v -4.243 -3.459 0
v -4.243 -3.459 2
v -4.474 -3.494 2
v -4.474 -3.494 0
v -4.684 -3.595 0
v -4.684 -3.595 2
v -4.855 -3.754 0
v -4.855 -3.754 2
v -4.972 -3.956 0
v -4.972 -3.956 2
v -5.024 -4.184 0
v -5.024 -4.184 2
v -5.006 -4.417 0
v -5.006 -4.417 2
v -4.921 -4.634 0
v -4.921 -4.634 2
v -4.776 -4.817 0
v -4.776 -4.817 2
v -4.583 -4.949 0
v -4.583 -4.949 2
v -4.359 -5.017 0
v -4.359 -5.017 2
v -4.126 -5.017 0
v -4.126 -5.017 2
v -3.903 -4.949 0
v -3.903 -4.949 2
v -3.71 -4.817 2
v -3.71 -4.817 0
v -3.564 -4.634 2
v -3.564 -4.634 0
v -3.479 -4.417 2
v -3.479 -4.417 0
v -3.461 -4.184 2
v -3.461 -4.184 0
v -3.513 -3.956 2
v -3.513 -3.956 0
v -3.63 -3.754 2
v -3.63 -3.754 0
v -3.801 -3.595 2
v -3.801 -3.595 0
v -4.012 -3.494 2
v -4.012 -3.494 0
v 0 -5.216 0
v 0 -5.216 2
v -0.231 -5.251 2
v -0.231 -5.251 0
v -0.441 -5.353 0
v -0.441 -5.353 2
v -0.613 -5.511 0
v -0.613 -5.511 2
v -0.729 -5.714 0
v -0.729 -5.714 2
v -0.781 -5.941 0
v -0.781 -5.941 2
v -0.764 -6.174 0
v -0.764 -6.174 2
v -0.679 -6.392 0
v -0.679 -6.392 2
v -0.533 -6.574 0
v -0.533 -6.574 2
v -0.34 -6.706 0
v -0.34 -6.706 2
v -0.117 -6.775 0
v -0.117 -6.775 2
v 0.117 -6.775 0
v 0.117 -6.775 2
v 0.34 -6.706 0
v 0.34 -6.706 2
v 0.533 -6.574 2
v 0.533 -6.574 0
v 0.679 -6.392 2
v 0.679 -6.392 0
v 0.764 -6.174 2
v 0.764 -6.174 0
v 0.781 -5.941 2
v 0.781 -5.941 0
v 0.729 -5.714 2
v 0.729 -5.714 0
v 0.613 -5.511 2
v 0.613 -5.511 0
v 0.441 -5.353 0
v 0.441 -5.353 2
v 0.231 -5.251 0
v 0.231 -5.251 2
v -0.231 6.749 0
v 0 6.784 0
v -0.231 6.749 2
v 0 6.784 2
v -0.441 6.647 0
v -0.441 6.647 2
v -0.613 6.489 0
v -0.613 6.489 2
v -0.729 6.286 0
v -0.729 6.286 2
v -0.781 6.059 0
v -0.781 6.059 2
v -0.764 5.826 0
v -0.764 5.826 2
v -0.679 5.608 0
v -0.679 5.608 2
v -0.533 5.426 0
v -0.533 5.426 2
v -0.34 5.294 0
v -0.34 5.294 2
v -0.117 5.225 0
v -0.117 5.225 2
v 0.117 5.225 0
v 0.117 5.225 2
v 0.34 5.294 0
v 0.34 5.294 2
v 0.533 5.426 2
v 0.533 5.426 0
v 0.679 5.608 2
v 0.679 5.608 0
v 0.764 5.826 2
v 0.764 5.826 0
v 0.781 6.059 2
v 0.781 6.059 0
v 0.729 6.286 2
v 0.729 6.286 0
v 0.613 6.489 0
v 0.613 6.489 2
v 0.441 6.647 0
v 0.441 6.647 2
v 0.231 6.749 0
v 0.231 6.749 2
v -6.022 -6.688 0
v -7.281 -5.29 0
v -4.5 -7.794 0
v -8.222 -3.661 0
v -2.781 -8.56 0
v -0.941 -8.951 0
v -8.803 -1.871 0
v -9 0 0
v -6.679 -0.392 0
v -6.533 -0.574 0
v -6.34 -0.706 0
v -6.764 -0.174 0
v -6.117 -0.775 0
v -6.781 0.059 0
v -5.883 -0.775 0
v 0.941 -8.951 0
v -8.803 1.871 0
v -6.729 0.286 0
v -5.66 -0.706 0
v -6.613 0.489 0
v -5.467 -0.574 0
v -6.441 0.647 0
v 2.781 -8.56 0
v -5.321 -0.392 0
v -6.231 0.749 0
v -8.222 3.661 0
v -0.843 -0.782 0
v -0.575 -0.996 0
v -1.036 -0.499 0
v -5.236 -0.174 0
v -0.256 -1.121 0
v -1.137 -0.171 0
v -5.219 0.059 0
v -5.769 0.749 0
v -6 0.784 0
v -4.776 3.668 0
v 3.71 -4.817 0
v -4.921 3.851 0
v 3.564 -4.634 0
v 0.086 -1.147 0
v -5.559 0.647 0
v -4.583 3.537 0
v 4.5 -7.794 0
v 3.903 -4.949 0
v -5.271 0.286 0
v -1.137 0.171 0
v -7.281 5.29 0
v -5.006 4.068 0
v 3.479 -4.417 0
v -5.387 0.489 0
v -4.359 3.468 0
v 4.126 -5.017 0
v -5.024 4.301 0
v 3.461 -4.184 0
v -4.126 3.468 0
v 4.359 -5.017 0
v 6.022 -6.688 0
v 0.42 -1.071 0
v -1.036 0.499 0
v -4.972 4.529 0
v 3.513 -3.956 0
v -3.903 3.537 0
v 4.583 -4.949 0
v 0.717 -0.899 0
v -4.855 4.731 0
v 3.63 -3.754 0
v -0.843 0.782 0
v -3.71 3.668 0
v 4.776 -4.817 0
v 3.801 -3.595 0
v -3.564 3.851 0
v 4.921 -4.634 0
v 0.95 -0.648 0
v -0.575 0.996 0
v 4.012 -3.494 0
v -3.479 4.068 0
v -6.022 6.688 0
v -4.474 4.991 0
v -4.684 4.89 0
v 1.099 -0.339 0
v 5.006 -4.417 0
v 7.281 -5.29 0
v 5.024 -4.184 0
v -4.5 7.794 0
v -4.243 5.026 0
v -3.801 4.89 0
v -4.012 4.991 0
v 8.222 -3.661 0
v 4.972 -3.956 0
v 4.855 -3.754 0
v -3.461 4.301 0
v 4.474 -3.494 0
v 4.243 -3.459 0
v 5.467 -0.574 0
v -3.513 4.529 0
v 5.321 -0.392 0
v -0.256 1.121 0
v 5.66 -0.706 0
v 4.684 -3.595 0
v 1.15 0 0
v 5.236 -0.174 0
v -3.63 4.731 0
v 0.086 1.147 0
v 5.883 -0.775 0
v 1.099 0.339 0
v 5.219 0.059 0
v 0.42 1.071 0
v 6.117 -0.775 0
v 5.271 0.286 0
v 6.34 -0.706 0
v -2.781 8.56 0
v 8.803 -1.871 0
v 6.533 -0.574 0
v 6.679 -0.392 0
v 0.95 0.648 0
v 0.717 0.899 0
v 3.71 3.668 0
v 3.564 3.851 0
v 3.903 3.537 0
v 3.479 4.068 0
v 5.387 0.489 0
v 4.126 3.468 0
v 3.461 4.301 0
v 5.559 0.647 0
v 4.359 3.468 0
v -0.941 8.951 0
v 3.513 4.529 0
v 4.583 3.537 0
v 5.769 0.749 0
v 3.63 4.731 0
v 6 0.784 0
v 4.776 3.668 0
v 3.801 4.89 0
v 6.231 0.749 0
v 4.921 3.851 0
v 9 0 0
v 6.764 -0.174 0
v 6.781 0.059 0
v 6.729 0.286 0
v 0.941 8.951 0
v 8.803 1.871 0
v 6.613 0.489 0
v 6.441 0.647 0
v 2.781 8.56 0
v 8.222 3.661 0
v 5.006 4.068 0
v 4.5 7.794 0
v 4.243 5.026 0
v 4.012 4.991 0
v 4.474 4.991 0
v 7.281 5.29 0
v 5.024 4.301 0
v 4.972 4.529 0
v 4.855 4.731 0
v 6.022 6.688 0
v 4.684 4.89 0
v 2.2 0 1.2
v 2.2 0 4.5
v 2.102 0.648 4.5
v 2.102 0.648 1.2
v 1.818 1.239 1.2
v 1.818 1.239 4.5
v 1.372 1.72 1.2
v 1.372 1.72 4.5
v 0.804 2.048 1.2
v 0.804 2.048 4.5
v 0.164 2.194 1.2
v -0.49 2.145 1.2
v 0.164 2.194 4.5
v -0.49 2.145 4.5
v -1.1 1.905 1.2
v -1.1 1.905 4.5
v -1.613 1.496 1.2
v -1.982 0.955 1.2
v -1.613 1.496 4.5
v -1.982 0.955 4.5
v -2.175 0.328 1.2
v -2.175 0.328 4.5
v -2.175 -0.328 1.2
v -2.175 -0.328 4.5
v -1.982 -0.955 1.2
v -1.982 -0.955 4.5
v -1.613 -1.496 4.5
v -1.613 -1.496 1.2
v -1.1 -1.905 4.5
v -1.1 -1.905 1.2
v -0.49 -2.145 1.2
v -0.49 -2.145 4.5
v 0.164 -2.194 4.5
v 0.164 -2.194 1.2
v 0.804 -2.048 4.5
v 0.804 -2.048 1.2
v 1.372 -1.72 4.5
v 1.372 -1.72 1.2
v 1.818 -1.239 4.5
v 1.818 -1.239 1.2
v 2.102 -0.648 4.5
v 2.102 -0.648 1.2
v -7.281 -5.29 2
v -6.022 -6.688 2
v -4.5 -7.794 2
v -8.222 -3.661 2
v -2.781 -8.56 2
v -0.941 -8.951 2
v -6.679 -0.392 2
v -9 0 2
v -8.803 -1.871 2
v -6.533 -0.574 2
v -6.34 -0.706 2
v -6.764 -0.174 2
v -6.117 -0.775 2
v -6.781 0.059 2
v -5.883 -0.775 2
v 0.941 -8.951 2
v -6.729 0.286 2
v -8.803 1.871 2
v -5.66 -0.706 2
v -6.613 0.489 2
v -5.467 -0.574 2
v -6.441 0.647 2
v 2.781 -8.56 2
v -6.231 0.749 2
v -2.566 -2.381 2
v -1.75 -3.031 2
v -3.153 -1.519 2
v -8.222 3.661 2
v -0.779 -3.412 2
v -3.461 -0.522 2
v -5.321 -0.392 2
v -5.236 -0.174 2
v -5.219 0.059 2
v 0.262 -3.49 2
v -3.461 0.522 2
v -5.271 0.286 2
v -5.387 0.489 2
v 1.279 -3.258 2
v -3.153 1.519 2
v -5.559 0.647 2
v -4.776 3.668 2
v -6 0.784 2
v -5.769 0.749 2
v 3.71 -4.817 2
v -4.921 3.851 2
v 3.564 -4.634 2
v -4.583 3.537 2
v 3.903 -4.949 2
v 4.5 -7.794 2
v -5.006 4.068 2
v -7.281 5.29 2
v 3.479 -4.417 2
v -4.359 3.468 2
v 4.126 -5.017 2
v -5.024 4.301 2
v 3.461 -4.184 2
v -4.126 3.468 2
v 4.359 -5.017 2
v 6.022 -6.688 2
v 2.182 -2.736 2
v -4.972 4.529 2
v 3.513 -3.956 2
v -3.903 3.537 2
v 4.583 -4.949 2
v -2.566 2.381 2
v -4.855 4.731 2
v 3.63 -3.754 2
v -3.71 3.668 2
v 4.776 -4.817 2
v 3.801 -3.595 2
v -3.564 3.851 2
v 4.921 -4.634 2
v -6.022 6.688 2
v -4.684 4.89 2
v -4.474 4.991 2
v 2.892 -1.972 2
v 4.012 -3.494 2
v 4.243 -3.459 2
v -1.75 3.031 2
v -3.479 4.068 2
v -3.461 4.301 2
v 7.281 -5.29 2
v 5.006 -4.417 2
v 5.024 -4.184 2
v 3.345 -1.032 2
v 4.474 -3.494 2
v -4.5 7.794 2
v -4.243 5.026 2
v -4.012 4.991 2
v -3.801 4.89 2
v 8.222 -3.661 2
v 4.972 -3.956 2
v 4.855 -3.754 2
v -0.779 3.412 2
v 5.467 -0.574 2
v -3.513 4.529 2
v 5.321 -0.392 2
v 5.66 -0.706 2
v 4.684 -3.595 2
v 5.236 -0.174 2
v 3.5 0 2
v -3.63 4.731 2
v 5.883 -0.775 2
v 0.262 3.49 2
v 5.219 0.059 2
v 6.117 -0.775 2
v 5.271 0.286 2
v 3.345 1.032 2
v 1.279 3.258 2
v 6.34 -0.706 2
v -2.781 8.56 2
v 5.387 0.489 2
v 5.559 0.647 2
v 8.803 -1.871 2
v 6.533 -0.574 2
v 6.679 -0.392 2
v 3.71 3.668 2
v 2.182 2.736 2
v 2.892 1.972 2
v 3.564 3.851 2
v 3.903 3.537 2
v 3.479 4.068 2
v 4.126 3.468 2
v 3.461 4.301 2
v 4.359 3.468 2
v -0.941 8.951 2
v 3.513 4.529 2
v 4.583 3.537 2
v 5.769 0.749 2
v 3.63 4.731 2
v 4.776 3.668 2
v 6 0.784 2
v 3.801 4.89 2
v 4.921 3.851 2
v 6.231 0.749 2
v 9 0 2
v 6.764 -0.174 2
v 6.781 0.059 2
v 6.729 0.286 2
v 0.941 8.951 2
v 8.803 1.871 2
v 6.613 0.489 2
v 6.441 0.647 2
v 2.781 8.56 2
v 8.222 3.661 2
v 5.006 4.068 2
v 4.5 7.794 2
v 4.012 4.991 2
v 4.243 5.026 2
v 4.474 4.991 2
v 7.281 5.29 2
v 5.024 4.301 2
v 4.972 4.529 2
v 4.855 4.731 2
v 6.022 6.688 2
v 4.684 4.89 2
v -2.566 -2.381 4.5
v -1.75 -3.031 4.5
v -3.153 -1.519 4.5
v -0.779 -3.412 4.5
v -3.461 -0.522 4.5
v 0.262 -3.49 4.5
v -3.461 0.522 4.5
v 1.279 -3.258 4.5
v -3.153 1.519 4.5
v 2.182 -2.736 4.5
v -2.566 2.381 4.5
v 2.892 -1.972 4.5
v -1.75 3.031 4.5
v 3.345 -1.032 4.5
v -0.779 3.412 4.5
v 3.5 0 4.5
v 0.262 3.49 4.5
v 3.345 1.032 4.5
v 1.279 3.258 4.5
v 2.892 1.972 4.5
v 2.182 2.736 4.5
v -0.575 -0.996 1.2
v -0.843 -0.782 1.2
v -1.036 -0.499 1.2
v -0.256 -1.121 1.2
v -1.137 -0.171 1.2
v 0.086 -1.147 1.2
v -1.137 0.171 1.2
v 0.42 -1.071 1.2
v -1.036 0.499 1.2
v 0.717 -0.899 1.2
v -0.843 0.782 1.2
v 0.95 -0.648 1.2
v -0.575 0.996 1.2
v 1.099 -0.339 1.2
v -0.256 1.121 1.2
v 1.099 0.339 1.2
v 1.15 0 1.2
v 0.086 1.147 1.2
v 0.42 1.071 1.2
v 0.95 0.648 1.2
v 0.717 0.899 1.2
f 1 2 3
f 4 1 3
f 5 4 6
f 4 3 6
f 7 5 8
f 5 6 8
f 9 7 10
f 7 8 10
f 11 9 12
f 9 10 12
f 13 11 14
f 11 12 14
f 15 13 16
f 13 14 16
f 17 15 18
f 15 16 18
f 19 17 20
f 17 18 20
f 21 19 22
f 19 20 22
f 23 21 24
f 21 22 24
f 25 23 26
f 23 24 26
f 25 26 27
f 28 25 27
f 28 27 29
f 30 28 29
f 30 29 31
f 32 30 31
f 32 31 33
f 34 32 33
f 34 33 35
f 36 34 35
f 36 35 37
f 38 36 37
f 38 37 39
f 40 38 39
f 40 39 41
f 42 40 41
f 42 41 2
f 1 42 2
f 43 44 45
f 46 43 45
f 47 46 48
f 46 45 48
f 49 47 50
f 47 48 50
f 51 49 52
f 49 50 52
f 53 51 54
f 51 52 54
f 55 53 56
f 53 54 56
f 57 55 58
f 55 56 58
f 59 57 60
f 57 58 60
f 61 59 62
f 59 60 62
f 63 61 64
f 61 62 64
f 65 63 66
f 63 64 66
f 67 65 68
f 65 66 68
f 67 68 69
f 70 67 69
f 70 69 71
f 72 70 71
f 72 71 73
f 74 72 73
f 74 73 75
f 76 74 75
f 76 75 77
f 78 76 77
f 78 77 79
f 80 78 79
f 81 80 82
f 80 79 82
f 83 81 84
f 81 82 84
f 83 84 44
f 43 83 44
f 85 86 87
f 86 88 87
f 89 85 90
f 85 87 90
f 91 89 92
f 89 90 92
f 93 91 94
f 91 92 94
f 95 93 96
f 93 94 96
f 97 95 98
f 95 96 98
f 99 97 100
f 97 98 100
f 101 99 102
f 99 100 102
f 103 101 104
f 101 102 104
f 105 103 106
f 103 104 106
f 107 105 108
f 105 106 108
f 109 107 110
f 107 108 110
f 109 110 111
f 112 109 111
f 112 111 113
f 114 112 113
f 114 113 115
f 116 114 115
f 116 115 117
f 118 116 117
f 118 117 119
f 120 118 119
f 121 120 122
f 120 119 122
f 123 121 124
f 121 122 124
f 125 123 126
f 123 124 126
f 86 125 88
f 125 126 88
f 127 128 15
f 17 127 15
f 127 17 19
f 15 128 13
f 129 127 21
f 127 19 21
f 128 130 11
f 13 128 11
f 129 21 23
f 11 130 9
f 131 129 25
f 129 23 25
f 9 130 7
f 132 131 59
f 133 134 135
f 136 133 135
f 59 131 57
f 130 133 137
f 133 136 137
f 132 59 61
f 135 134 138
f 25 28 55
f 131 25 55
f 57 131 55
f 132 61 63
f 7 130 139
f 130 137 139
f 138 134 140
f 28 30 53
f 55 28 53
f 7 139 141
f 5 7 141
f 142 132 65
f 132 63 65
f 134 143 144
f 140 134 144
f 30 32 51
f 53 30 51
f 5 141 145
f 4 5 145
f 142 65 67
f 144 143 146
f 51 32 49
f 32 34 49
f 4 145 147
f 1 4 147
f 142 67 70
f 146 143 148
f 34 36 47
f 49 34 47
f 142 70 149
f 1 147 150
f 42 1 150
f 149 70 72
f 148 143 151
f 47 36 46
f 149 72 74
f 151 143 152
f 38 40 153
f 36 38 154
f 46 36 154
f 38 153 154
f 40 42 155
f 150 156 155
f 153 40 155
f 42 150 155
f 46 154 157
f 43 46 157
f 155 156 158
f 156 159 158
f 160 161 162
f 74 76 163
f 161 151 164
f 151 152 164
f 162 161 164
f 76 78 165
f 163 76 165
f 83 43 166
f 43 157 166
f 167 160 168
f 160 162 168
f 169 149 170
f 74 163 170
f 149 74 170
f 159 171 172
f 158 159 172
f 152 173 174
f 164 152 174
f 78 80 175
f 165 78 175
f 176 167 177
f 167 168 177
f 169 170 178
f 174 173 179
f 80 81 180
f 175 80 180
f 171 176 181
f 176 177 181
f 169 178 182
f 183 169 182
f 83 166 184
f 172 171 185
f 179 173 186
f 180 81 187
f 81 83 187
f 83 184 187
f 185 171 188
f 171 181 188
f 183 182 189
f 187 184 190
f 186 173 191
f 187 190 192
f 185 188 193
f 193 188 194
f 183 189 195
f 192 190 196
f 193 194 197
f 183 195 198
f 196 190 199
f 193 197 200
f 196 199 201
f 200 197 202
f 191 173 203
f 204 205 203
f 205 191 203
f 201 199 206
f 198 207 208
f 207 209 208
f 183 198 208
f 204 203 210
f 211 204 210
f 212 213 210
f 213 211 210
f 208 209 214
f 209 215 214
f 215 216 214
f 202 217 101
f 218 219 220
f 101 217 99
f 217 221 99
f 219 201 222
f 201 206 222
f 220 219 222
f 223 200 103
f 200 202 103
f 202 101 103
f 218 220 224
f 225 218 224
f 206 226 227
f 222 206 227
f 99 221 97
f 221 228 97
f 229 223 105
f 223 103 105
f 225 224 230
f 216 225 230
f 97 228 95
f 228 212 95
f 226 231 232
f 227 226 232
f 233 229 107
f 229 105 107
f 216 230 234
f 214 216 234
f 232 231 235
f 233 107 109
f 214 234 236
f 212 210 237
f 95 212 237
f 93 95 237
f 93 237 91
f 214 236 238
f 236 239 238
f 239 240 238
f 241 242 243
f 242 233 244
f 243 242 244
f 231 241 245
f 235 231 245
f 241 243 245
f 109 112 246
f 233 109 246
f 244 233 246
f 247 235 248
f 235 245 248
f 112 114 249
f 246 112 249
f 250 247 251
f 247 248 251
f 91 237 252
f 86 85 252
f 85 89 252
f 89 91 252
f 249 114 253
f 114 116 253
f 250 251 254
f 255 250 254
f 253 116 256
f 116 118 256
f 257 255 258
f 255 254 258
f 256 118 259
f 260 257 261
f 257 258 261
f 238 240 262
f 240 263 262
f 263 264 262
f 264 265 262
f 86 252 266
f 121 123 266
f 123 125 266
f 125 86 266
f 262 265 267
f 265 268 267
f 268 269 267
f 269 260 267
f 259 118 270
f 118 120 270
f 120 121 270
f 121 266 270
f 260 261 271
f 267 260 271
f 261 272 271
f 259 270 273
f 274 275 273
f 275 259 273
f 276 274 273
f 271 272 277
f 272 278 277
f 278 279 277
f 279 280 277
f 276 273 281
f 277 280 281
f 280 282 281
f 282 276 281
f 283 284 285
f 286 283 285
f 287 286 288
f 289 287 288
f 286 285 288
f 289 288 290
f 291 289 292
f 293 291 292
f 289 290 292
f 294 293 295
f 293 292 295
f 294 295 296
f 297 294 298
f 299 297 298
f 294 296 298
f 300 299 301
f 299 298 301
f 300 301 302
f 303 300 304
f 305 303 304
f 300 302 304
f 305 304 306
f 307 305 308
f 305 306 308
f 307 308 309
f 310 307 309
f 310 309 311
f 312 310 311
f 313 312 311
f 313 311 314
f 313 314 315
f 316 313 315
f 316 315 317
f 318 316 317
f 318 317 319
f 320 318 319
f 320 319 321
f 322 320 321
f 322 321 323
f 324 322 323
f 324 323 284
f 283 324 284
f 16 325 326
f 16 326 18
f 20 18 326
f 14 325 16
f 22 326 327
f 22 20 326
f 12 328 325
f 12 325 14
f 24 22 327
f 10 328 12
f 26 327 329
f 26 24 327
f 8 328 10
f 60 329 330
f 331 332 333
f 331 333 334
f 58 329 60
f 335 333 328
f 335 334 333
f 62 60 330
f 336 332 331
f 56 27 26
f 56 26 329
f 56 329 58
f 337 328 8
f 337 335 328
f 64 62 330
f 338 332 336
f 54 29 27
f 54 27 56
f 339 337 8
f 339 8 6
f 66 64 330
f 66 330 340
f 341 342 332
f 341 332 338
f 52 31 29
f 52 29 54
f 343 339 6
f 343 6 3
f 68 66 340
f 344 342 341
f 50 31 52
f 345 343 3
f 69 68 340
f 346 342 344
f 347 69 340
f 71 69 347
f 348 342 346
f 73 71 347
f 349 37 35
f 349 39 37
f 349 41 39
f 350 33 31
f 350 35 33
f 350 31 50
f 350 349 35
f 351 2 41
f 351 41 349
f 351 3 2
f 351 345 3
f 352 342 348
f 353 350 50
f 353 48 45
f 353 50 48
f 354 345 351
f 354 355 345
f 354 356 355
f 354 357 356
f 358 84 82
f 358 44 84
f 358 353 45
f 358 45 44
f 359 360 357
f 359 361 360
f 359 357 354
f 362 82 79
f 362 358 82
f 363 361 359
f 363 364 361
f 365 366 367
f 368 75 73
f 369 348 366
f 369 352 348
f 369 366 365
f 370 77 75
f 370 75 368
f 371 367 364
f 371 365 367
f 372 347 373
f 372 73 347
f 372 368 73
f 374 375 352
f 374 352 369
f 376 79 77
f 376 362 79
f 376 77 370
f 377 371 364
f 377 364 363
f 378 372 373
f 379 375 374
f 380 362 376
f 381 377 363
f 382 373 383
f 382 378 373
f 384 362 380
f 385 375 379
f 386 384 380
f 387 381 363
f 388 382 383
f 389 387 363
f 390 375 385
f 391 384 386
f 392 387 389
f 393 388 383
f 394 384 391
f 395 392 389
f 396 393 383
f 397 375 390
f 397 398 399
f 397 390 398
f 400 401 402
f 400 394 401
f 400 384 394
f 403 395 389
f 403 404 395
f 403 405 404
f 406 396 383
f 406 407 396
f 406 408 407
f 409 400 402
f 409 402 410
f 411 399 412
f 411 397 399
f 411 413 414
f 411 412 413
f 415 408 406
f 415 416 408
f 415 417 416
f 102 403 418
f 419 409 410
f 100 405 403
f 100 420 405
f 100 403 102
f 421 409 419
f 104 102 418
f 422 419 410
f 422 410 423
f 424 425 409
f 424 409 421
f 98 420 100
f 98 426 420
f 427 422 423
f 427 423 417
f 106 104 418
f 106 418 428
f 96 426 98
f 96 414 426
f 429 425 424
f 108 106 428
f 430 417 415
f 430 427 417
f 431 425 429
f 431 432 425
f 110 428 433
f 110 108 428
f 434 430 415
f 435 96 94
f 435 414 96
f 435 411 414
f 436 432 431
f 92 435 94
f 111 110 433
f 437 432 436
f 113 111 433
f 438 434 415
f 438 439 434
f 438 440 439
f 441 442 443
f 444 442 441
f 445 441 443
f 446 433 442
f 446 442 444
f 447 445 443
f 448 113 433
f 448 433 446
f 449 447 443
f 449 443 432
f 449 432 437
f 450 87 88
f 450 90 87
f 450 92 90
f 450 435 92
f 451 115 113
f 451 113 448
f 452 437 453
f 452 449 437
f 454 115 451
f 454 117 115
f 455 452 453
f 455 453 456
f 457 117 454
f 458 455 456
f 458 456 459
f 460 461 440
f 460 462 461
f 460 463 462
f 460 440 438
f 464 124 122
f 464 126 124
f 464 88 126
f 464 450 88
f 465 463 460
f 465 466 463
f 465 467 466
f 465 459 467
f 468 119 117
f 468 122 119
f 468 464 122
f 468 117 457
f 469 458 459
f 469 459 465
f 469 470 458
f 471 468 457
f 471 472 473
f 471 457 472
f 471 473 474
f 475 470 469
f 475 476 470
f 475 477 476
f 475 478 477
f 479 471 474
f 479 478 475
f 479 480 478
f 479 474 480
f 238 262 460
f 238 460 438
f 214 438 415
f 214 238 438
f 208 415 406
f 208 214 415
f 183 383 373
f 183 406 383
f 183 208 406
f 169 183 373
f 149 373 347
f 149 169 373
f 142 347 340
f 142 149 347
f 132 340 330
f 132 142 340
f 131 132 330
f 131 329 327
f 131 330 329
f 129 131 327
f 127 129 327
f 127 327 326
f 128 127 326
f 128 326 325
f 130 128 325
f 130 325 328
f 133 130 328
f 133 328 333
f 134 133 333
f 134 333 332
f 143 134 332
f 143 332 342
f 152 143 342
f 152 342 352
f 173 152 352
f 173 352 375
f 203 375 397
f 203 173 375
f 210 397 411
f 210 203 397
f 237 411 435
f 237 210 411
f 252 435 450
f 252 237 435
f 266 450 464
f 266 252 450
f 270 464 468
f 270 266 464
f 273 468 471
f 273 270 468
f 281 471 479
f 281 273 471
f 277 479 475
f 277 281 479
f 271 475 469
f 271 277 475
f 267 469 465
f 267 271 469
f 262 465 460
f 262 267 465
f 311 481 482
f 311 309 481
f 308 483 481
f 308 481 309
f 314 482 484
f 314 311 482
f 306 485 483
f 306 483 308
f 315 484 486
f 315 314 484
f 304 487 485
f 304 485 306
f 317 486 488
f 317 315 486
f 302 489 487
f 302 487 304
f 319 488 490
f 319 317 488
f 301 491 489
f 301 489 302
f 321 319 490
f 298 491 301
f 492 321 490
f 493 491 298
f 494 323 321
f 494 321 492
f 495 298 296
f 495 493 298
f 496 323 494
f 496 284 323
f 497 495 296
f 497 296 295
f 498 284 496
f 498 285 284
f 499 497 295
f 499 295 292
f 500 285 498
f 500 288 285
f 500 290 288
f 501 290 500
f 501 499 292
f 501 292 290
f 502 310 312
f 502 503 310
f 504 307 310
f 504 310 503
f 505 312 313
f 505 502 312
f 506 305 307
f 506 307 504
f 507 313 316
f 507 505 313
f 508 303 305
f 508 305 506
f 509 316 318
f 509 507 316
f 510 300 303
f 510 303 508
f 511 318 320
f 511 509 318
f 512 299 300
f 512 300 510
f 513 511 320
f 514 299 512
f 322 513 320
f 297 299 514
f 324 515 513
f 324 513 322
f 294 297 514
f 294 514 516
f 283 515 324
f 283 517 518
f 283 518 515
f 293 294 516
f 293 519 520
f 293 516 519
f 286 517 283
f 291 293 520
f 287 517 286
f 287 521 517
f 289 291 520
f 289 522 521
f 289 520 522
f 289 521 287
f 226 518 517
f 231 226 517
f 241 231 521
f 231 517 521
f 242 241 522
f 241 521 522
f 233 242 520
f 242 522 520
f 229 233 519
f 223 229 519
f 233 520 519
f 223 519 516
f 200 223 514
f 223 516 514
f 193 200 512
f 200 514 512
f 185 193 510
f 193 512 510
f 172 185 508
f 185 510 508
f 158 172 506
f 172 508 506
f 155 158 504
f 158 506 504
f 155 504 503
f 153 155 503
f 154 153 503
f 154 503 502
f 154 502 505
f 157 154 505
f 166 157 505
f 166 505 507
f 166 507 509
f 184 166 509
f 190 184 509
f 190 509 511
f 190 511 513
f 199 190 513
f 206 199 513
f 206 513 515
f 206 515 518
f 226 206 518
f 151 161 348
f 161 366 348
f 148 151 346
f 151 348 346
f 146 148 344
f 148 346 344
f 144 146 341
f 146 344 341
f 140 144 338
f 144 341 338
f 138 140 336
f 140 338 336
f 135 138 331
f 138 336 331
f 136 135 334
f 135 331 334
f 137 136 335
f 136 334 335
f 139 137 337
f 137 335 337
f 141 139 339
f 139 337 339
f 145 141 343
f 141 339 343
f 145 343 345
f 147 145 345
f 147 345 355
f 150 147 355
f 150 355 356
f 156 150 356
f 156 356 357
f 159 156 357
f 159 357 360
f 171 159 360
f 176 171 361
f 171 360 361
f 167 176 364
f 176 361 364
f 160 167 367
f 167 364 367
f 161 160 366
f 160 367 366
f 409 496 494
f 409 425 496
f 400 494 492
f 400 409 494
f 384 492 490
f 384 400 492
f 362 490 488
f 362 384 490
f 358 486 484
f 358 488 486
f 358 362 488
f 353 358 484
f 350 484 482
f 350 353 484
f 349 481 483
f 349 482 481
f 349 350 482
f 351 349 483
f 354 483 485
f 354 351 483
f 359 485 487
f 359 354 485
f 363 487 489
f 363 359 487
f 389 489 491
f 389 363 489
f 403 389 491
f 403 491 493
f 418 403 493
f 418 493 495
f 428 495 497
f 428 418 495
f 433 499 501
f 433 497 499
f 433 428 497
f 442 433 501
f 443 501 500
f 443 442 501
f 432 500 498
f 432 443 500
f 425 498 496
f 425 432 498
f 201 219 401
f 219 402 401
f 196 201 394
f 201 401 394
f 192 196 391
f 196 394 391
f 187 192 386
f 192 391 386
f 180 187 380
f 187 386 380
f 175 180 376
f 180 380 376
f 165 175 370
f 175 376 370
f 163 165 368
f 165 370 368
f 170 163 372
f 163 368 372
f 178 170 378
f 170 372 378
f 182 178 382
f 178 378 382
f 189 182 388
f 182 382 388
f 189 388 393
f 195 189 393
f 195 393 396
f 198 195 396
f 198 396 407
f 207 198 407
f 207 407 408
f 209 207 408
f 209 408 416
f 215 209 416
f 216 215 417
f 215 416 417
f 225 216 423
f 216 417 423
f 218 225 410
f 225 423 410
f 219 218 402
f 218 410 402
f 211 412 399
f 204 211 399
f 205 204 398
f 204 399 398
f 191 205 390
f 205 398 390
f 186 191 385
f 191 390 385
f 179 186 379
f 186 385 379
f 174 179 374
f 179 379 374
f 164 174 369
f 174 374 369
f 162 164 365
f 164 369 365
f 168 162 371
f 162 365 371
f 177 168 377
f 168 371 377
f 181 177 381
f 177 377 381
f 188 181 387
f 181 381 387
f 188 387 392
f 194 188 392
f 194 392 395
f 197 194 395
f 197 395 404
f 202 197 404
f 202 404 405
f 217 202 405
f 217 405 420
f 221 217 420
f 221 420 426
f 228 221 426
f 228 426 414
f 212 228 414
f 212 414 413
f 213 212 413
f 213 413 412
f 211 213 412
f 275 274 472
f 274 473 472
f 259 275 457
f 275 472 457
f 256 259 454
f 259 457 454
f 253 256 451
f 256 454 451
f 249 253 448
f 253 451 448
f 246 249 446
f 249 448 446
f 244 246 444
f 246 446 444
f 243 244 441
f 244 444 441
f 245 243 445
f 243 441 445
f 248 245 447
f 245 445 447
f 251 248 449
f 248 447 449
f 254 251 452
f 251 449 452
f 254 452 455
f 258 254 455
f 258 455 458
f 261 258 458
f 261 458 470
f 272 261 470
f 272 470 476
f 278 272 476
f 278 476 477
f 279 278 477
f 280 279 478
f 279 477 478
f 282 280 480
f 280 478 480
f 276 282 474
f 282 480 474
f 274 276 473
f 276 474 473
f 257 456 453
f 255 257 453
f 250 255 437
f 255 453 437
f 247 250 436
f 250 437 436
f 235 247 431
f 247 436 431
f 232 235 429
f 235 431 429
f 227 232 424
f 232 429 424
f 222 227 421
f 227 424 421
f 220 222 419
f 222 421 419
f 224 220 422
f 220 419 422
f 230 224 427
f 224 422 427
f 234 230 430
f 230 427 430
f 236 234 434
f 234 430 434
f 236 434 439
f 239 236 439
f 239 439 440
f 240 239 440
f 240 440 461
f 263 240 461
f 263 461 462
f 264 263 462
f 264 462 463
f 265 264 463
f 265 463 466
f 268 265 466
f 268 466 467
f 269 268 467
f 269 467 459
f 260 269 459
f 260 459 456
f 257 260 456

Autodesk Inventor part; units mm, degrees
ref_plane "YZ Plane" through (0, 0, 0) normal (1, 0, 0) x (0, 1, 0)
ref_plane "XZ Plane" through (0, 0, 0) normal (0, 1, 0) x (-1, 0, 0)
ref_plane "XY Plane" through (0, 0, 0) normal (0, 0, 1) x (1, 0, 0)
sketch "スケッチ1" plane through (0, 0, 0) normal (0, 0, 1) x (1, 0, 0)
  circle A0 centre (0, 0) radius 9
  dimension "d0" = 18
extrude "押し出し1" add sketch "スケッチ1" along normal blind 2
sketch "スケッチ2" plane through (0, 0, 2) normal (0, 0, 1) x (1, 0, 0)
  circle A0 centre (0, 0) radius 3.5
  dimension "d3" = 7
extrude "押し出し2" add sketch "スケッチ2" along normal blind 2.5
sketch "スケッチ3" plane through (0, 0, 4.5) normal (0, 0, 1) x (1, 0, 0)
  circle A0 centre (0, 0) radius 2.2
  dimension "d6" = 4.4
extrude "押し出し3" cut sketch "スケッチ3" against normal blind 3.3
sketch "スケッチ4" plane through (0, 0, 1.2) normal (0, 0, 1) x (1, 0, 0)
  circle A0 centre (0, 0) radius 2.2 projected
  circle A1 centre (0, 0) radius 1.15
  dimension "d9" = 2.3
extrude "押し出し4" cut sketch "スケッチ4" against normal through all contours A1
sketch "スケッチ5" plane through (0, 0, 0) normal (0, 0, -1) x (-1, 0, 0)
  circle A0 centre (0, 0) radius 6 construction
  line L0 (0, -11.2961) -> (0, 11.2961) construction
  line L1 (-11.4539, 0) -> (11.4539, 0) construction
  point P0 (0, 6)
  point P1 (-4.2426, 4.2426)
  point P2 (-6, 0)
  point P3 (-4.2426, -4.2426)
  point P4 (0, -6)
  point P5 (4.2426, -4.2426)
  point P6 (6, 0)
  point P7 (4.2426, 4.2426)
  dimension "d12" = 12
  dimension "d15" = 360
hole "穴1" at (0, 6, 0) at (4.2426, 4.2426, 0) at (6, 0, 0) at (4.2426, -4.2426, 0) at (0, -6, 0) at (-4.2426, -4.2426, 0) at (-6, 0, 0) at (-4.2426, 4.2426, 0) direction (0, 0, 1) diameter 1.567 end through all thread size "M2x0.4" class "6H" standard "ISO Metric profile"
properties part number "STS3032_Horn"
